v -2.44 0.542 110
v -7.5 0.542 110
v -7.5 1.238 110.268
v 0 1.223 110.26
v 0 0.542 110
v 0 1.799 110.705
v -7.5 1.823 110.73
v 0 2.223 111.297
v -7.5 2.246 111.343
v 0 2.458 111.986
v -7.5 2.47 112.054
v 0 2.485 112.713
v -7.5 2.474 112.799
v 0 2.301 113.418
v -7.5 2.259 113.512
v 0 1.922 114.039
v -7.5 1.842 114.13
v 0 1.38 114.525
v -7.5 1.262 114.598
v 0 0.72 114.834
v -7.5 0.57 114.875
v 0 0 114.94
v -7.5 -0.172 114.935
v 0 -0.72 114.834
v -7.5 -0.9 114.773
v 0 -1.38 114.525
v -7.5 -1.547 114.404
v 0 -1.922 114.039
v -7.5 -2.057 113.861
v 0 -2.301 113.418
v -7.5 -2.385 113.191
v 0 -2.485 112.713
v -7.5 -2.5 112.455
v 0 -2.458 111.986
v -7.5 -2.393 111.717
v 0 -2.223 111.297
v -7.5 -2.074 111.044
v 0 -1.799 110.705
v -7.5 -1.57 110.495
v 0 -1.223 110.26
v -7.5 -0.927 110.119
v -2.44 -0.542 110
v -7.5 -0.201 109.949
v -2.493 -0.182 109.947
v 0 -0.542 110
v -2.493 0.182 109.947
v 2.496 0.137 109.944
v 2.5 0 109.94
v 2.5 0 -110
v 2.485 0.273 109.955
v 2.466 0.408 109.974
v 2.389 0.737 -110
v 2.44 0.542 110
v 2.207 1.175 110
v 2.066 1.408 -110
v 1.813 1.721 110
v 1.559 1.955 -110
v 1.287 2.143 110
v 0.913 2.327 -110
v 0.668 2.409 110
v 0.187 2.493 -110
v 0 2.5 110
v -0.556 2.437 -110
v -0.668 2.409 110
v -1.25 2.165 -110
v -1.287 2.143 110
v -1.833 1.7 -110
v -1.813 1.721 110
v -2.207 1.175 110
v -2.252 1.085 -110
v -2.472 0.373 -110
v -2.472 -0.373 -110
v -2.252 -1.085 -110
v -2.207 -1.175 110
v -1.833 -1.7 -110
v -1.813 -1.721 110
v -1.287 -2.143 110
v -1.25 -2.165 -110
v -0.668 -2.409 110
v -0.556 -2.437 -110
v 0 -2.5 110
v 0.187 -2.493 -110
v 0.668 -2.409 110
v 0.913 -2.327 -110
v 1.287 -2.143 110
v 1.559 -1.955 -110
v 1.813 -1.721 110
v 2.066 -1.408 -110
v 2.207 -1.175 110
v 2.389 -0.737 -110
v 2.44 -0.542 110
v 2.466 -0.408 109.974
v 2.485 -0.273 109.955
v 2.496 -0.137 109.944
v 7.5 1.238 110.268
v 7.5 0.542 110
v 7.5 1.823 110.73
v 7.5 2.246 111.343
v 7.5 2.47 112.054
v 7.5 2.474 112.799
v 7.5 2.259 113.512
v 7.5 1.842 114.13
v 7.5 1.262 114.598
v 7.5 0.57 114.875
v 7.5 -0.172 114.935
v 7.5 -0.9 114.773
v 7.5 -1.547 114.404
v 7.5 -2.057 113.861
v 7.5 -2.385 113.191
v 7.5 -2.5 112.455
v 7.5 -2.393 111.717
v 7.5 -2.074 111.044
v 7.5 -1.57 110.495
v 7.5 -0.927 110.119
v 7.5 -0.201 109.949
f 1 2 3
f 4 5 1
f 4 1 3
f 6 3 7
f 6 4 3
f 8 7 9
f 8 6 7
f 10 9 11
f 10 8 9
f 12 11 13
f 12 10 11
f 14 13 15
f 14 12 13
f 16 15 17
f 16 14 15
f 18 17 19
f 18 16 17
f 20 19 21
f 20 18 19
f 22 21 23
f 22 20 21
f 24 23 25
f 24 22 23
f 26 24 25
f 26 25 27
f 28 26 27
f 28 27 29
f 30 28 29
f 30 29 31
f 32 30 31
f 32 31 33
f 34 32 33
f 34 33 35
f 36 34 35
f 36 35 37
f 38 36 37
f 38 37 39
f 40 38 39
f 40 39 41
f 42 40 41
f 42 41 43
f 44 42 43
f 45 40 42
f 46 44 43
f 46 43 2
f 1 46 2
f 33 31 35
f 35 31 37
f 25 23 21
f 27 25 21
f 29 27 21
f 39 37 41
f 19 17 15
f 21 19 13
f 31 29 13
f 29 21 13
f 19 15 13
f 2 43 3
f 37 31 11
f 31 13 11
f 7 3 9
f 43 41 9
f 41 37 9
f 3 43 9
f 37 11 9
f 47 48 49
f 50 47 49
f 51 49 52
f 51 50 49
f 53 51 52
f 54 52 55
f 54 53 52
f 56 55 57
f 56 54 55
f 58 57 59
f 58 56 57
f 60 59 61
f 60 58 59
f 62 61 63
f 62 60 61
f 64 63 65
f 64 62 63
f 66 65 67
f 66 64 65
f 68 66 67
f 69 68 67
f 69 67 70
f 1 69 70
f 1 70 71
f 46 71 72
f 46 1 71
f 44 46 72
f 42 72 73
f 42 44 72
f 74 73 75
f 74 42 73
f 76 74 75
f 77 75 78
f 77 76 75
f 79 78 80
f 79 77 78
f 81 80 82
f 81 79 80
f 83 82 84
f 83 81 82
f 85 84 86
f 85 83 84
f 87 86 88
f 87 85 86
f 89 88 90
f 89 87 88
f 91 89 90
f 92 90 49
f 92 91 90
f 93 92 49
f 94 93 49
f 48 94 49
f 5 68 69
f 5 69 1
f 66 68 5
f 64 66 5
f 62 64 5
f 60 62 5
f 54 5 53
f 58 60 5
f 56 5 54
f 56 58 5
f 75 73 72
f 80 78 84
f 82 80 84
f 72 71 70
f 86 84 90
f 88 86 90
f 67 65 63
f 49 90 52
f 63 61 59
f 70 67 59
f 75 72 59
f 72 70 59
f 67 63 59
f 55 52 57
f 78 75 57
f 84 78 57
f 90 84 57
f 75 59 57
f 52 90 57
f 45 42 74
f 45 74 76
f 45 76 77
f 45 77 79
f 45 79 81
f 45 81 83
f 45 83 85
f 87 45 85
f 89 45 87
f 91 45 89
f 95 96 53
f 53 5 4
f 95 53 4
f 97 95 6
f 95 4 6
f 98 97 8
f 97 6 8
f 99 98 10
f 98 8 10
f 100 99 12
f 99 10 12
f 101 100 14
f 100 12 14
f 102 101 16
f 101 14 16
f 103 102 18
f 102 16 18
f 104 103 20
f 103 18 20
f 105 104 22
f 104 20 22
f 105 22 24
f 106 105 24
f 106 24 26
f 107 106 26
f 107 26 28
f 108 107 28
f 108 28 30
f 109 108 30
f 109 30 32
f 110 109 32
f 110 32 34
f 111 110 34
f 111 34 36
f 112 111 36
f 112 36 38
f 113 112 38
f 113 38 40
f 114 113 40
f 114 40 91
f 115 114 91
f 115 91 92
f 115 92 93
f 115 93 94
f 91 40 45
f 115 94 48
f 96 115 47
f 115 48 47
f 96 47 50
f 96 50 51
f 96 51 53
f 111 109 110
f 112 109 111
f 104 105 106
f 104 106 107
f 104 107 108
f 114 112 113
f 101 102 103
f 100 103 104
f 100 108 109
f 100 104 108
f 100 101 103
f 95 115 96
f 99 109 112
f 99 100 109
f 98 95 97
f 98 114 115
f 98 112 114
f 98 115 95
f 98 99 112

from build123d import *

# Parameters (mm, degrees)
SKETCH_1_R      = 2.5
EXTRUDE_1_DEPTH = 110
SKETCH_2_R      = 2.5
EXTRUDE_2_DEPTH = 7.5


with BuildPart() as part:
    # 草图1 → 凸台-拉伸1 (new, symmetric)
    with BuildSketch(Plane.XY):
        Circle(SKETCH_1_R)
    extrude(amount=EXTRUDE_1_DEPTH, both=True)

    # 草图2 → 凸台-拉伸2 (add)
    with BuildSketch(Plane(origin=(0, 0, 0), x_dir=(0, 0, -1), z_dir=(1, 0, 0))):
        with Locations(Location((-112.44047791, 0, 0), (0, 0, 12.527723759))):
            Circle(SKETCH_2_R)
    extrude_2 = extrude(amount=EXTRUDE_2_DEPTH)

    # 镜向1: 凸台-拉伸2 across plane
    add(extrude_2.mirror(Plane(origin=(0, 0, 0), x_dir=(0, 0, 1), z_dir=(1, 0, 0))))


solid = part.part
